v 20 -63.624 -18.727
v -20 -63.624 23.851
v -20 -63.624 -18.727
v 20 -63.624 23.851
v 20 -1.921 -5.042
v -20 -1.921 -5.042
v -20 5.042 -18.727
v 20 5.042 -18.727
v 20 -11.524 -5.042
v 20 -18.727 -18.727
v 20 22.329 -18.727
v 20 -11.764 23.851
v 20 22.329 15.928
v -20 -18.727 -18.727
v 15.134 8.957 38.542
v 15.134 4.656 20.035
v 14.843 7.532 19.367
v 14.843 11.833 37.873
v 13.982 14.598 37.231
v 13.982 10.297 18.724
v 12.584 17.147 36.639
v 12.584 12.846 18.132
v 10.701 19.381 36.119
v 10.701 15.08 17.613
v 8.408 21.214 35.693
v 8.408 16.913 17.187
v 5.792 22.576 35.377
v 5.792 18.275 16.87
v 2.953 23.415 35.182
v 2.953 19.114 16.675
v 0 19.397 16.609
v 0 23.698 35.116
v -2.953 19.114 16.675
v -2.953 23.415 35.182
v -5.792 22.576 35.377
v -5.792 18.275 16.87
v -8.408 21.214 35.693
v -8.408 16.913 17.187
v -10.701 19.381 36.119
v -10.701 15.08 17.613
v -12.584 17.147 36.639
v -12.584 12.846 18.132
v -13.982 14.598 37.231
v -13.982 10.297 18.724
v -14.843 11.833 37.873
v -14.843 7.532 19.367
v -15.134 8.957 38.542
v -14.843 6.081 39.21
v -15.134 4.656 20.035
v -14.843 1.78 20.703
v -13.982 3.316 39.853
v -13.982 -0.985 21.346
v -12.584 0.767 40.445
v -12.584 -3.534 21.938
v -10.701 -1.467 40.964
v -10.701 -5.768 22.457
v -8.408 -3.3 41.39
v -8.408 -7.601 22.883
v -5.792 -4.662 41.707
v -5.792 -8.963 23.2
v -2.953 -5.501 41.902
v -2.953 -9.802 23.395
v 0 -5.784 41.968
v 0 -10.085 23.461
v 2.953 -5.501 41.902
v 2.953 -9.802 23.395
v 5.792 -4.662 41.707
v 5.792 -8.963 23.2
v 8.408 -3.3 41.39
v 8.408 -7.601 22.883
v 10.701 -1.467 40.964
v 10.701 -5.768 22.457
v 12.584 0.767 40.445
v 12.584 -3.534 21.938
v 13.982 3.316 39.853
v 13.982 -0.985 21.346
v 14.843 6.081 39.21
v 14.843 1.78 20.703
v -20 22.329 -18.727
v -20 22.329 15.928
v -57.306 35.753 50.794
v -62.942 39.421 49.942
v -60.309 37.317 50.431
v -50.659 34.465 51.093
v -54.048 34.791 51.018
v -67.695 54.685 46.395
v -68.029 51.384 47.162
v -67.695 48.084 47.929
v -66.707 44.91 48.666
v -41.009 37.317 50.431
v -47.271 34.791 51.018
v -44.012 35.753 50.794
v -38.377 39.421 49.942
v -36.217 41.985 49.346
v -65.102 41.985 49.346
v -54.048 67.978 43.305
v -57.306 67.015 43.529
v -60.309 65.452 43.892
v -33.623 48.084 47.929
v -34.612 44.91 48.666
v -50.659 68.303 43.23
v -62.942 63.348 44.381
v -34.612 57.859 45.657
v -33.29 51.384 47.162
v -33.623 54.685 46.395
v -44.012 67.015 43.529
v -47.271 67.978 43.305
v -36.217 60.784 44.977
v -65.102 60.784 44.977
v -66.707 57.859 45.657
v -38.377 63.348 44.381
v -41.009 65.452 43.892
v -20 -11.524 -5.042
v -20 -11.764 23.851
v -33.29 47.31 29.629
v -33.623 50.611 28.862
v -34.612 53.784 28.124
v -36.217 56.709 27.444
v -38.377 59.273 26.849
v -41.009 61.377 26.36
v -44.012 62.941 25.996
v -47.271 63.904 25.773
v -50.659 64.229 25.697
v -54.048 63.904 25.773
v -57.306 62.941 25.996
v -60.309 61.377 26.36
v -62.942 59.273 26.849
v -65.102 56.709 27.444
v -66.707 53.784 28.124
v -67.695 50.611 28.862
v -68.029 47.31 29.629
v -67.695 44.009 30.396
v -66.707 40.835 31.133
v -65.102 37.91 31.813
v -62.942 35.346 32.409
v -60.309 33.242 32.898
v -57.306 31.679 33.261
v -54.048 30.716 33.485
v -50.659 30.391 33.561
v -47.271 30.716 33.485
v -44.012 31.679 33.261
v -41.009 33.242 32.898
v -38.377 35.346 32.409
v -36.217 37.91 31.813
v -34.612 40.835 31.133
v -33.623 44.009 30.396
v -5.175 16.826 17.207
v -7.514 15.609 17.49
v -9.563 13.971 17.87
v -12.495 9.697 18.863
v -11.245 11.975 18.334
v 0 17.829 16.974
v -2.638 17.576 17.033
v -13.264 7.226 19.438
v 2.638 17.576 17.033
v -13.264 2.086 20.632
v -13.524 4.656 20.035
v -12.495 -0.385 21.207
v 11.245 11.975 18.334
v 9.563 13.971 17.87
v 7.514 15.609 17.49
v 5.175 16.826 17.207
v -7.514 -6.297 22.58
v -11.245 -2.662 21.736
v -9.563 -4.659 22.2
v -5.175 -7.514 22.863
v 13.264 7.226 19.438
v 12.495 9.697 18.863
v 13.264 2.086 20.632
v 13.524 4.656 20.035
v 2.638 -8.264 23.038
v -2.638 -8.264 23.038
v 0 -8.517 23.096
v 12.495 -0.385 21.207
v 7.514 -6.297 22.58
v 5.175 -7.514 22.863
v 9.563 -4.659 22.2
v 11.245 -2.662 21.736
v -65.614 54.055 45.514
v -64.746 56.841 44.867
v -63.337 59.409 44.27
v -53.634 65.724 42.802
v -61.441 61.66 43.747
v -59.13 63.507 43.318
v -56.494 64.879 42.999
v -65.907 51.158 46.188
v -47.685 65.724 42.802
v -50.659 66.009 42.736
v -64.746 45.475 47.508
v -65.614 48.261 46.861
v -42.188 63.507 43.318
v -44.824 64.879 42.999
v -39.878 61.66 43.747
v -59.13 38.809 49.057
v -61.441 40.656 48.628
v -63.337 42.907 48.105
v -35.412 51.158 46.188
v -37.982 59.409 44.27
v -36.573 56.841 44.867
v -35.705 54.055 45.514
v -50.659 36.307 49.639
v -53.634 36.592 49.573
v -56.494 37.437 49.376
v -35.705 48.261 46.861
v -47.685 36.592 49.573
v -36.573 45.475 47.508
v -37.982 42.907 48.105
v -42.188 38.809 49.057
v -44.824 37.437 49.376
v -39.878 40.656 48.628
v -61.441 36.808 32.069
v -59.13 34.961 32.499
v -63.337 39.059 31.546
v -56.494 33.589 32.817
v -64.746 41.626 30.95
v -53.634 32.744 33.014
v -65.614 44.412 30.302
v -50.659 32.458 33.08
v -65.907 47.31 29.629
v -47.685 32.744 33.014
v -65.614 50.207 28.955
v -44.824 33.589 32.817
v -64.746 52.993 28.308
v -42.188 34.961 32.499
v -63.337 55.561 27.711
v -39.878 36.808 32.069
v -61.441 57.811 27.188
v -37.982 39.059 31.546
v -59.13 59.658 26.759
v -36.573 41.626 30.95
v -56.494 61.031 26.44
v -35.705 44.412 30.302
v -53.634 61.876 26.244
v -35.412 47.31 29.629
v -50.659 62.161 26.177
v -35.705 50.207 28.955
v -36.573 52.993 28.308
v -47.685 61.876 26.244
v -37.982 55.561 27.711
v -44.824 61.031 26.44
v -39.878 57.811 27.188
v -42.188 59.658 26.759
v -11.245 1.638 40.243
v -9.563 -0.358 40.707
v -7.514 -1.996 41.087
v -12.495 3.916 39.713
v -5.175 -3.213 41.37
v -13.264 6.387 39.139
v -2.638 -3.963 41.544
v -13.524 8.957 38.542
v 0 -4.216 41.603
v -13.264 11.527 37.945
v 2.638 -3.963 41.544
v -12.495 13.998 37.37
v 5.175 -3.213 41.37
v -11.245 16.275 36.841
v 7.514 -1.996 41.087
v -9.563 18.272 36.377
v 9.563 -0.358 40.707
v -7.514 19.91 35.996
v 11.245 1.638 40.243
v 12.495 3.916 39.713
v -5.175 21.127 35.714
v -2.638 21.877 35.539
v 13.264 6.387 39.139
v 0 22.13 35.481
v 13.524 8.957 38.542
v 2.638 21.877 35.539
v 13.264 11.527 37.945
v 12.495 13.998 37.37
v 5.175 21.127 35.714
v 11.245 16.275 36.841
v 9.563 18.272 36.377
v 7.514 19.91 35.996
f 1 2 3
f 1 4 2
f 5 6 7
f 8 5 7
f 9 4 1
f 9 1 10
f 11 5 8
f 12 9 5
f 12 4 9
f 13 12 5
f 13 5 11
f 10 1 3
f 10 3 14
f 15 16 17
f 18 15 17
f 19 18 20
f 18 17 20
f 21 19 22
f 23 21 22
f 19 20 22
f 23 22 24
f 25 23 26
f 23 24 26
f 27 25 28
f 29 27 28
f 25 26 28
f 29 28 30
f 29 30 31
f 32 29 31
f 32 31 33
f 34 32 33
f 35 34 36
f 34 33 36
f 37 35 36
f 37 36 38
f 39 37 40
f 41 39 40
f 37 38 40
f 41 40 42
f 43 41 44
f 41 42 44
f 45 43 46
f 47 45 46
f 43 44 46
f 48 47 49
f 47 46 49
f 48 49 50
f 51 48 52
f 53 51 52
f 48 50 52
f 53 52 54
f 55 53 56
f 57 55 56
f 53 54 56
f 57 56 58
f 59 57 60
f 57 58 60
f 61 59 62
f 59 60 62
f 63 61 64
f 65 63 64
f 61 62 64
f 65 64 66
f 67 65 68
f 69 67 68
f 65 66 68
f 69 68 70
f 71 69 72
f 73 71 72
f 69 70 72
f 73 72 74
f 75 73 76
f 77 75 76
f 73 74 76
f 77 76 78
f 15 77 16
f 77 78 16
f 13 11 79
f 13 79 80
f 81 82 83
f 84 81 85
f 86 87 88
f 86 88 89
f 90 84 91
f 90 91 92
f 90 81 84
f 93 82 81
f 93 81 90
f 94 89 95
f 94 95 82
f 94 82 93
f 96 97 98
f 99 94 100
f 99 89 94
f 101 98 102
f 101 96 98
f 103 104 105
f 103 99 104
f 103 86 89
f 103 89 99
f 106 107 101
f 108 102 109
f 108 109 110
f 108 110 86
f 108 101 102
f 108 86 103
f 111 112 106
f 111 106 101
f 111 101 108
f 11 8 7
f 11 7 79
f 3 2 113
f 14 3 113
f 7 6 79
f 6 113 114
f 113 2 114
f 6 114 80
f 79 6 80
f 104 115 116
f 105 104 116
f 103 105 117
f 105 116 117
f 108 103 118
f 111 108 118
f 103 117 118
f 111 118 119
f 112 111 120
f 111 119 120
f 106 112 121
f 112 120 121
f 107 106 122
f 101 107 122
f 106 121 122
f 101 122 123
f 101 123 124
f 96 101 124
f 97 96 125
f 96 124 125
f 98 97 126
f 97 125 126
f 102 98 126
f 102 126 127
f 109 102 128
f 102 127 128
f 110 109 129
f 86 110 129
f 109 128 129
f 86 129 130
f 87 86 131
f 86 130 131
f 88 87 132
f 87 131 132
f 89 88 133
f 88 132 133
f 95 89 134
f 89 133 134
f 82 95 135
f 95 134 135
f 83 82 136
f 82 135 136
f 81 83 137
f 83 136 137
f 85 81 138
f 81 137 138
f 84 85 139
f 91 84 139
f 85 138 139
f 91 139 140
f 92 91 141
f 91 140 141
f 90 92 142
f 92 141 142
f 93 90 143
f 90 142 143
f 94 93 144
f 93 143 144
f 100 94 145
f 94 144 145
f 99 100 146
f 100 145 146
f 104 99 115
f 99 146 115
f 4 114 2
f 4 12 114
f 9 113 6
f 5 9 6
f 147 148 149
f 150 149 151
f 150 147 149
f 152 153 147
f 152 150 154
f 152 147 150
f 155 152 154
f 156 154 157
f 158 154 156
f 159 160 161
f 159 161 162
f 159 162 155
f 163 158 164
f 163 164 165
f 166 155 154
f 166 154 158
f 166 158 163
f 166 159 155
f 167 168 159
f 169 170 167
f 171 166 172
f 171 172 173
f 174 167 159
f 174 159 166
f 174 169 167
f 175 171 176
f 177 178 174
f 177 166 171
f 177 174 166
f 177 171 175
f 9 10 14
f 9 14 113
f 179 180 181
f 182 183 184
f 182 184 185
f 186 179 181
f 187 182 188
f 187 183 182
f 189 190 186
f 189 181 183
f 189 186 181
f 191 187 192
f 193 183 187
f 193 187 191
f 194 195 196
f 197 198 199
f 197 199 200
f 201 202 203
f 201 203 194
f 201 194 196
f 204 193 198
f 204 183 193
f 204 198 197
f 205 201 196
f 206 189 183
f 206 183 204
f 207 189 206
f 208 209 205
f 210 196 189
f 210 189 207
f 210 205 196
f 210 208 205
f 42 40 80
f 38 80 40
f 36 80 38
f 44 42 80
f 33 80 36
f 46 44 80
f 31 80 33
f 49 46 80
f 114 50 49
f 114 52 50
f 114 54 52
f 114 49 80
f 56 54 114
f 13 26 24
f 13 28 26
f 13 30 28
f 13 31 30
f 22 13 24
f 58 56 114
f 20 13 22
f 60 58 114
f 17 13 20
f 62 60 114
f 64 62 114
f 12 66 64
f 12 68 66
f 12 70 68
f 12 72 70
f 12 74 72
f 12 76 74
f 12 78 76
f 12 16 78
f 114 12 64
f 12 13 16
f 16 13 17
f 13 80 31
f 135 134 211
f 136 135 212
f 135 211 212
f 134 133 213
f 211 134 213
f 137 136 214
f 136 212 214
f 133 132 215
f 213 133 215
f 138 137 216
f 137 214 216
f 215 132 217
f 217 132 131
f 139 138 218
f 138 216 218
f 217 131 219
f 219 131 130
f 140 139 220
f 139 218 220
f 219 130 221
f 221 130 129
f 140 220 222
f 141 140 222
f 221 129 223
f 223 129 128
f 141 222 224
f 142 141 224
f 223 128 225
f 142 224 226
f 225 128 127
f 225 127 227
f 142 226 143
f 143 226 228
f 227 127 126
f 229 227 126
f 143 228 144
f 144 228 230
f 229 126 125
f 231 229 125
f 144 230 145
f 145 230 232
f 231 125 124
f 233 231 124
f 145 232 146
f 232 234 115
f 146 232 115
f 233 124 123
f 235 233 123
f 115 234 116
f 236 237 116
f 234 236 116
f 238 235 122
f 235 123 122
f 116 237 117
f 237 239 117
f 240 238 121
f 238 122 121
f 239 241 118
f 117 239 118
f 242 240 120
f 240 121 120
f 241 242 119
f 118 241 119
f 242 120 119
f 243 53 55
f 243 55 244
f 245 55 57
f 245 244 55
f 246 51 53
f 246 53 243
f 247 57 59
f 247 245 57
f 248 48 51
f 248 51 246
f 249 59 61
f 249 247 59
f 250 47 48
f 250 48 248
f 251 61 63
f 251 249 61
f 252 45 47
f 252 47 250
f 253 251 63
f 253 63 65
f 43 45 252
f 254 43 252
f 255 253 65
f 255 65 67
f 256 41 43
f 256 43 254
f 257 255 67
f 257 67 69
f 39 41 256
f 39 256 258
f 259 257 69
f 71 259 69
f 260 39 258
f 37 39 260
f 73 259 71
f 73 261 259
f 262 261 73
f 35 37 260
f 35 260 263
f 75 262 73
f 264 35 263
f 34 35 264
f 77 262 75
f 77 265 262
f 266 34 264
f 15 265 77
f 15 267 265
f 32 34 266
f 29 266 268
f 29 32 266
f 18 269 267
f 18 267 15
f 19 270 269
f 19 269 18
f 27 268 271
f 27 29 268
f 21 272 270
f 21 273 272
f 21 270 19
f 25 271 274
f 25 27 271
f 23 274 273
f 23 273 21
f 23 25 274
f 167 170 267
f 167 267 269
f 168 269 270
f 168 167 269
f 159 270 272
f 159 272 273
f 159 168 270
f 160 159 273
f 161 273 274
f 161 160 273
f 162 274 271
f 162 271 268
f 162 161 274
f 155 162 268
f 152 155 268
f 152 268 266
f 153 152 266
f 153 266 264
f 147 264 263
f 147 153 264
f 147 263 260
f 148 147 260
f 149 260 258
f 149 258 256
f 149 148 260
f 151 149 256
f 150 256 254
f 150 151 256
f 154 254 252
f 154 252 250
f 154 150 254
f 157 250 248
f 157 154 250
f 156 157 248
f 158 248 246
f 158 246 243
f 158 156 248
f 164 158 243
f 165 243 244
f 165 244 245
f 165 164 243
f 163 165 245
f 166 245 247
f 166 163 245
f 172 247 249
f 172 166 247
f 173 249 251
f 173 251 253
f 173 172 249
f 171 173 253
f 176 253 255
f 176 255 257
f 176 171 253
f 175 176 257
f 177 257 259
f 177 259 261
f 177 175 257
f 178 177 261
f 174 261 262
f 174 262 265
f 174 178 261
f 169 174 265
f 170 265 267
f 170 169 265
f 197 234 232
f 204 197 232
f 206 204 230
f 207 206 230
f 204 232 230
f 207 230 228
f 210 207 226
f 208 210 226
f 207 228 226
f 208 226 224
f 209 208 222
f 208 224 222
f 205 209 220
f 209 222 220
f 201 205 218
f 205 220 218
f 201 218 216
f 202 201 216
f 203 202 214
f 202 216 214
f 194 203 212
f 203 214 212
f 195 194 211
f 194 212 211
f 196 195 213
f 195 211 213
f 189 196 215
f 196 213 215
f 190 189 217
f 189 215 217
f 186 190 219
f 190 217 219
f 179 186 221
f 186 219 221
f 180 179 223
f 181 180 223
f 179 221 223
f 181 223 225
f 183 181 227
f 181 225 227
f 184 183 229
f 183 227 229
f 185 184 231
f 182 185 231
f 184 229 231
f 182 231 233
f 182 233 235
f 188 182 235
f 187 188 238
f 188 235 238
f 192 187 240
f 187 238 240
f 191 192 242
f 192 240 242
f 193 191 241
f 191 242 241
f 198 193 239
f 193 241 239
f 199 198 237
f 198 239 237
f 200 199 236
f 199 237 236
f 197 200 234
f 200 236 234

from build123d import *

# Parameters (mm, degrees)
F1_DEPTH = 20
F2_R     = 15.1341211979
F2_R_2   = 13.5239981161
F3_DEPTH = 19
F4_R     = 17.3697524292
F5_DEPTH = 18
F6_R     = 15.2472264347
F7_DEPTH = 17


with BuildPart() as f1:
    # F0 (on Right) → F1 (new body, symmetric)
    with BuildSketch(Plane.YZ):
        Polygon((-63.624240458, 23.85104257), (-63.624240458, -18.7271349132), (-18.7271349132, -18.7271349132), (-11.5243913606, -5.0419210456), (-1.9207322039, -5.0419210456), (5.041921977, -18.7271349132), (22.3285052925, -18.7271349132), (22.3285052925, 15.9280243827), (-11.7644835263, 23.85104257), align=None)
    extrude(amount=F1_DEPTH, both=True)

    # F2 (on face) → F3 (join)
    with BuildSketch(Plane(origin=(0, 4.6560231333, 20.0350094965), x_dir=(1, 0, 0), z_dir=(0, 0.2263621452, 0.9740432122))):
        Circle(F2_R)
        Circle(F2_R_2, mode=Mode.SUBTRACT)
    extrude(amount=F3_DEPTH)


with BuildPart() as f5:
    # F4 (on face) → F5 (new body)
    with BuildSketch(Plane(origin=(0, 8.9569038921, 38.5418305281), x_dir=(1, 0, 0), z_dir=(0, 0.2263621452, 0.9740432122))):
        with Locations((-50.6593026221, 39.3750034273)):
            Circle(F4_R)
    extrude(amount=F5_DEPTH)

    # F6 (on face) → F7 (cut)
    with BuildSketch(Plane(origin=(0, 8.9569038921, 38.5418305281), x_dir=(1, 0, 0), z_dir=(0, -0.2263621452, -0.9740432122))):
        with Locations((-50.6593026221, -39.3750034273)):
            Circle(F6_R)
    extrude(amount=-F7_DEPTH, mode=Mode.SUBTRACT)


solid = Compound([f1.part, f5.part])
